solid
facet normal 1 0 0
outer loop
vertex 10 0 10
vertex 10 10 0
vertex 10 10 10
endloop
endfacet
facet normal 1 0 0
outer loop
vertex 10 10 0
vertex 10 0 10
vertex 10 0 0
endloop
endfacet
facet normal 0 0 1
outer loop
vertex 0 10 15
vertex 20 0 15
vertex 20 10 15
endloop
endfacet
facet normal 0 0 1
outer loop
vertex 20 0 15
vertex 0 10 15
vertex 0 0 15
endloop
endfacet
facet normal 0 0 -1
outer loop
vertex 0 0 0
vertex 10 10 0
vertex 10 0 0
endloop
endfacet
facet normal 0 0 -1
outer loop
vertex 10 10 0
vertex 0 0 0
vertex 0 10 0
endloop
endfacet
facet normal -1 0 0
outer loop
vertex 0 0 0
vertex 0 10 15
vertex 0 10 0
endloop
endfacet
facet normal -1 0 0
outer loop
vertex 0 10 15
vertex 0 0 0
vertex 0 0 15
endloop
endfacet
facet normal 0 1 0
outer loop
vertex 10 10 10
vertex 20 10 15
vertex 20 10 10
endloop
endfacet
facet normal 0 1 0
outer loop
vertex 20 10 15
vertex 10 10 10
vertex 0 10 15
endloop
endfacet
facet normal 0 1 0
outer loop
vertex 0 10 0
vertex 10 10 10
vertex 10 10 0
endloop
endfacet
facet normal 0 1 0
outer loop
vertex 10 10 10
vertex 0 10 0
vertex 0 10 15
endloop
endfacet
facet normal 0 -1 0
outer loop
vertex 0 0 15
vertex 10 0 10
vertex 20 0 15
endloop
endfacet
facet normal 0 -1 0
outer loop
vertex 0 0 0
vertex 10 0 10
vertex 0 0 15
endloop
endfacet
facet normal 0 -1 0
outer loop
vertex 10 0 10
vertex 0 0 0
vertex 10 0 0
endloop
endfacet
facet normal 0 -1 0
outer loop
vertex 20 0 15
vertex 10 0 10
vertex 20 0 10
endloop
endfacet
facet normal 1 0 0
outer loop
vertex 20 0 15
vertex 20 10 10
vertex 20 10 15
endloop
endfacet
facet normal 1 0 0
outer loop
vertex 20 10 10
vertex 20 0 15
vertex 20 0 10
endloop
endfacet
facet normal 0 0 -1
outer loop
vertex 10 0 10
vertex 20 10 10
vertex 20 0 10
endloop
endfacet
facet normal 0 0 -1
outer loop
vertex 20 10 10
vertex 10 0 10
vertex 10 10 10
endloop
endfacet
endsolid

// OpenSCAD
cube([10,10,15],center=false);
translate([10,0,10]) cube([10,10,5],center=false);
